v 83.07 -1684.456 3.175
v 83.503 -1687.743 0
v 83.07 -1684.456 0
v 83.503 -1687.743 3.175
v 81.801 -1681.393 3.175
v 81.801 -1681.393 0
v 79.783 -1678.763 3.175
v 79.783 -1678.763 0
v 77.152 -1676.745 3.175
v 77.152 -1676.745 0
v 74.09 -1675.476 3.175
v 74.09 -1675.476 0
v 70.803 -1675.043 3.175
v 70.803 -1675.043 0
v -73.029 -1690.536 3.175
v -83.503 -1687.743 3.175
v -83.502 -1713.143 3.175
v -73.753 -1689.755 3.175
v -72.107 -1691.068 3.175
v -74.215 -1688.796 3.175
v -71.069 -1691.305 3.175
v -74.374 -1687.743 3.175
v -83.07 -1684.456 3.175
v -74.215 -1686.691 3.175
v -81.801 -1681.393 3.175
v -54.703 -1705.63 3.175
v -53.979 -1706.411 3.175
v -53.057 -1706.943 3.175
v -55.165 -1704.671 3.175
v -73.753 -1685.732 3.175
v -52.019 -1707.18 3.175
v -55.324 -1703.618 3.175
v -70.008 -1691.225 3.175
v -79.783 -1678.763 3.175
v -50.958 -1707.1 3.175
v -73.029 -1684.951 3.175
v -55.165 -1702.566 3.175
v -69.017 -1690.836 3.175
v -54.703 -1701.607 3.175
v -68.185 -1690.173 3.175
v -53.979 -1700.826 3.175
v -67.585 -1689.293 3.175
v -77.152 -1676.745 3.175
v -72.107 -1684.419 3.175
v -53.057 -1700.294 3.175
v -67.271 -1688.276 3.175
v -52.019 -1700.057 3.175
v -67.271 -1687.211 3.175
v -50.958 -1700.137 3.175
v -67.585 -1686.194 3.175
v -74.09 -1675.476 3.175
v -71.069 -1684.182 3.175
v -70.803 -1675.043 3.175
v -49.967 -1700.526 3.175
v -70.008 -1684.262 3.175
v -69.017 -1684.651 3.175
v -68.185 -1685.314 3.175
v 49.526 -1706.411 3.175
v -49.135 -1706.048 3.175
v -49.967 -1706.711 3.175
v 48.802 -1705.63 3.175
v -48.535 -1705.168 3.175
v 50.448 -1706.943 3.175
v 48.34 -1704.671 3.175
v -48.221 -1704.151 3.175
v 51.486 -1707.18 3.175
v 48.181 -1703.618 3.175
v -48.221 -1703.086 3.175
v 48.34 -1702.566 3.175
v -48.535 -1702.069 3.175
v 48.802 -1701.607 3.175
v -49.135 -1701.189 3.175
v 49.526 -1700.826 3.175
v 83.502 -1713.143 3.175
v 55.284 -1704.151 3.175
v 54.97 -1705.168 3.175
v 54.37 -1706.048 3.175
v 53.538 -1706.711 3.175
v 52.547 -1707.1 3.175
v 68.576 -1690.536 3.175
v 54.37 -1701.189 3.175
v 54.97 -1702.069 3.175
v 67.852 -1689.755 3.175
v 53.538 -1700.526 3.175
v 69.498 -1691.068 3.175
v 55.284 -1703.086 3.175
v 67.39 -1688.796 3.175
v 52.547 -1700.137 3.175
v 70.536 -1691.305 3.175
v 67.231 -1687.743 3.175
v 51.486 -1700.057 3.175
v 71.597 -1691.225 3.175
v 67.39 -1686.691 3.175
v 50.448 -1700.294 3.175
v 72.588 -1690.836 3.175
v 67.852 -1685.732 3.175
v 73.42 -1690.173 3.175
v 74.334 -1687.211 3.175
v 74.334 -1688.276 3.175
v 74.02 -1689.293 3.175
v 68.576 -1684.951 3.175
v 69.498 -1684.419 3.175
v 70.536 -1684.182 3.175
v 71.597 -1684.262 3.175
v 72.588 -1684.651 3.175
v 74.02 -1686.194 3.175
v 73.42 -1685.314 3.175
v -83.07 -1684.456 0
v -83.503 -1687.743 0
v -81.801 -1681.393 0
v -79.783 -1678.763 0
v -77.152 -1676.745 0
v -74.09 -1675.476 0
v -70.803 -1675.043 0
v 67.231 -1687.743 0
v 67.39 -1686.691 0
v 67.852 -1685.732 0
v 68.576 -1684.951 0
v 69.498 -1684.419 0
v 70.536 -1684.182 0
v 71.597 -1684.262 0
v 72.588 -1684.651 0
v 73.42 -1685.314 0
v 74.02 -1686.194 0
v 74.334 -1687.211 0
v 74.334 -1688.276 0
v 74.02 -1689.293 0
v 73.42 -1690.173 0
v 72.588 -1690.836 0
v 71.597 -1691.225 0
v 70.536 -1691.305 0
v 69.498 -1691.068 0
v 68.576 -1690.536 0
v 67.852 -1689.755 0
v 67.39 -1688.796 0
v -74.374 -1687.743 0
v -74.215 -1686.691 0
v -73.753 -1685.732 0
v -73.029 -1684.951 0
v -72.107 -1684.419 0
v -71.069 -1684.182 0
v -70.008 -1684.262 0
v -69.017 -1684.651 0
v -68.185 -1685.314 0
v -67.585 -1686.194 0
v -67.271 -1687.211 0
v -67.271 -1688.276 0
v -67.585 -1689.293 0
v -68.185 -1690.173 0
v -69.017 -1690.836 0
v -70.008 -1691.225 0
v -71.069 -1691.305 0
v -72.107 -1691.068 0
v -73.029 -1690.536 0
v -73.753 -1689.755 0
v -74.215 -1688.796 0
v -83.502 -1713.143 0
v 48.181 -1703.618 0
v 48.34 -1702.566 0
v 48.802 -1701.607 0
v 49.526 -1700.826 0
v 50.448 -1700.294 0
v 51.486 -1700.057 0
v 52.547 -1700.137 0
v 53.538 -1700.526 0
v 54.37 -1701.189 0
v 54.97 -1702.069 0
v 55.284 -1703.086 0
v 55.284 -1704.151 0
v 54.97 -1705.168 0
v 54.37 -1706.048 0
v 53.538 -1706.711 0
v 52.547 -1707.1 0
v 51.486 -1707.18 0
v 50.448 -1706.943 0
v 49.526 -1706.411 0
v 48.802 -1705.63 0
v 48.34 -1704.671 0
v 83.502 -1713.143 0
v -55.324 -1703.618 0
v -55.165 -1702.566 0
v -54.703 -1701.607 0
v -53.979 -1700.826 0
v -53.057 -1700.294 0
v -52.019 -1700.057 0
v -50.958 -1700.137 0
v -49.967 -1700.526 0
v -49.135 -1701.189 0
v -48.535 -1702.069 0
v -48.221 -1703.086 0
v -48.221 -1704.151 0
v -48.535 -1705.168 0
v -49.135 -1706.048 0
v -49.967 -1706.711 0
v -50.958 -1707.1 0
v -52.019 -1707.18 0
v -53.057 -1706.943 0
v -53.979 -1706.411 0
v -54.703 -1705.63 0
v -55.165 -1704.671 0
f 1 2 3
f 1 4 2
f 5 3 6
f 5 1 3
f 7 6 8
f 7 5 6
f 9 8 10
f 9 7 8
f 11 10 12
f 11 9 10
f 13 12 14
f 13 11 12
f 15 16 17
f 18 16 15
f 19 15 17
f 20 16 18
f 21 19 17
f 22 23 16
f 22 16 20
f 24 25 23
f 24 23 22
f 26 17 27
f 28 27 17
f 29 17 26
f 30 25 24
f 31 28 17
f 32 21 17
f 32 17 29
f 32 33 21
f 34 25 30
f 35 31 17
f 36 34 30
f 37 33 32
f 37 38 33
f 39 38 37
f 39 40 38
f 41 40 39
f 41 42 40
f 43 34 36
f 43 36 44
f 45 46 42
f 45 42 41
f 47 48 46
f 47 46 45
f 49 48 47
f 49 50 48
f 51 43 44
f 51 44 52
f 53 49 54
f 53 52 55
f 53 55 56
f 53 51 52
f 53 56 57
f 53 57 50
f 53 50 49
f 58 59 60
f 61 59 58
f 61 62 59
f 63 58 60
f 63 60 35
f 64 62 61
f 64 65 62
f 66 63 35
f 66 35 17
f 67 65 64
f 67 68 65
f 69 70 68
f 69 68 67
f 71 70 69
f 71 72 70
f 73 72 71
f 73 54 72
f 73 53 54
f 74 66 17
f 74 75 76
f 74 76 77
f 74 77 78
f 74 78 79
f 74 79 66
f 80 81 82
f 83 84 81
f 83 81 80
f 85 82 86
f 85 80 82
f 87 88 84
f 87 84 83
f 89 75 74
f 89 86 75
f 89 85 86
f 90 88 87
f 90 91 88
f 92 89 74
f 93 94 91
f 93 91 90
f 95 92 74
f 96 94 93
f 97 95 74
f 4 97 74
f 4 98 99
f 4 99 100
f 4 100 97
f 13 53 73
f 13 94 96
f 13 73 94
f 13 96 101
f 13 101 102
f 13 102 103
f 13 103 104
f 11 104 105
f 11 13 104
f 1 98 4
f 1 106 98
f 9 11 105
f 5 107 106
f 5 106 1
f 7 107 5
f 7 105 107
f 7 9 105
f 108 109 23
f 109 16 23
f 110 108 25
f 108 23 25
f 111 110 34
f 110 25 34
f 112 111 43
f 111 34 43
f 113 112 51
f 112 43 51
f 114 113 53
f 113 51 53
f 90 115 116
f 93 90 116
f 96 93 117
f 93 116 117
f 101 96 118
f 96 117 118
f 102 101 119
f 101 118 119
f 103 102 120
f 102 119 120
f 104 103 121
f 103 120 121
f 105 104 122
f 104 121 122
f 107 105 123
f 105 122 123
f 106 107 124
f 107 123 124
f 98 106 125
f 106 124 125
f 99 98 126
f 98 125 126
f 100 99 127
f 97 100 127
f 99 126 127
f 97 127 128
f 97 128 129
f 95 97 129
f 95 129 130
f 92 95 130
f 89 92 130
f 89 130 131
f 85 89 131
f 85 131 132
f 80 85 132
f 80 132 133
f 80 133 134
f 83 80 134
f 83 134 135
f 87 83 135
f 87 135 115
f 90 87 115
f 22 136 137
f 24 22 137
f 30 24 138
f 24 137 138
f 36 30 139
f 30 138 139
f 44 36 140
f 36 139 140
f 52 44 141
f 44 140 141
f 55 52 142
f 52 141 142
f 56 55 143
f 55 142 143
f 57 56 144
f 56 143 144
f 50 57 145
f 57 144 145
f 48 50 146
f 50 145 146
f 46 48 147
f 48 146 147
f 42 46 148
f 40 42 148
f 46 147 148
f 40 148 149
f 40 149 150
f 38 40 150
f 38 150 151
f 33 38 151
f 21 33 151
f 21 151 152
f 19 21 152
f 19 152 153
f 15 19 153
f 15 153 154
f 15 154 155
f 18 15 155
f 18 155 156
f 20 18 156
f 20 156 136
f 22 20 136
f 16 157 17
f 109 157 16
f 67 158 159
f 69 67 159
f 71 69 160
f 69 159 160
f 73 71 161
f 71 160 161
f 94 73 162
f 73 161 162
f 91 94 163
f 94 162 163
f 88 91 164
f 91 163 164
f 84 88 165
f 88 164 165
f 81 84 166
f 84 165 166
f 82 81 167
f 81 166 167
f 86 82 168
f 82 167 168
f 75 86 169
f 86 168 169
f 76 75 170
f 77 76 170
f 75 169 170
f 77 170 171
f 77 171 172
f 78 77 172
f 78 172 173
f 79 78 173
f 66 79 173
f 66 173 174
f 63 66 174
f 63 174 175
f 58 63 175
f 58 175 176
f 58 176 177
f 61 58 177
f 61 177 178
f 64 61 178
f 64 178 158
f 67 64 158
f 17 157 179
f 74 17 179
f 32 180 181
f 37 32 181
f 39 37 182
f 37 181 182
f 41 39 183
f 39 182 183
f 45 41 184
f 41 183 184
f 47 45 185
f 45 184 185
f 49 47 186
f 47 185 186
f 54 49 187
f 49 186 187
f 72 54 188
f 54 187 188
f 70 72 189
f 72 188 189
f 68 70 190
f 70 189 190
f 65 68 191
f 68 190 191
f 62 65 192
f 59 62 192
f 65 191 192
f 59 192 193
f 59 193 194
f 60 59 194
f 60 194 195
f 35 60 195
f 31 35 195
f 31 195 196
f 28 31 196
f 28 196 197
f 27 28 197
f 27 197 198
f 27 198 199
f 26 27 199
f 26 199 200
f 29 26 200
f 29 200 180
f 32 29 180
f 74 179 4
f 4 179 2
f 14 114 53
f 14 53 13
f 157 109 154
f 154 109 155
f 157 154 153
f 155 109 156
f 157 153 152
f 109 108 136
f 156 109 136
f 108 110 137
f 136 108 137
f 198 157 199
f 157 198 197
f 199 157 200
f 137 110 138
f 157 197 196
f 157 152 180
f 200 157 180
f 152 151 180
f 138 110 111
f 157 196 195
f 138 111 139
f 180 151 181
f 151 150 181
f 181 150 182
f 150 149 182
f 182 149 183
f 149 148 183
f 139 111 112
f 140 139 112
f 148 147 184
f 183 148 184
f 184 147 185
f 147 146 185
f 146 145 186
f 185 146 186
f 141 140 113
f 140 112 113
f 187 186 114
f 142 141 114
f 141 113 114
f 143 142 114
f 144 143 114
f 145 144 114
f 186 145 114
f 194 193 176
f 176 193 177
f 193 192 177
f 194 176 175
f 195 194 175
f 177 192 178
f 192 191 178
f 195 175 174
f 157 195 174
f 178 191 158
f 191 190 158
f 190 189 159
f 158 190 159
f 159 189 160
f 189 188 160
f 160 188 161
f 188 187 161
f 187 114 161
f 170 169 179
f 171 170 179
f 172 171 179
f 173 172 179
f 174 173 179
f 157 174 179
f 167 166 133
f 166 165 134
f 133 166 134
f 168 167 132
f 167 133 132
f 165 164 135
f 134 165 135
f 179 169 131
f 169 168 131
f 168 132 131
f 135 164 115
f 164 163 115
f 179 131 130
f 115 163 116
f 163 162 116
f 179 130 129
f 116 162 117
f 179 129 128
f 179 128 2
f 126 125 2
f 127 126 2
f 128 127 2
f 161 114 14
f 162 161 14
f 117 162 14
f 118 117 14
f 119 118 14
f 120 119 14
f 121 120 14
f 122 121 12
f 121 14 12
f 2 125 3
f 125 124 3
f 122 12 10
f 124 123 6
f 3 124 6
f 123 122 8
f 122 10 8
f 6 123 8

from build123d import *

# Parameters (mm, degrees)
SKETCH1_W                   = 167.005
SKETCH1_H                   = 38.1
BOSS_EXTRUDE1_DEPTH         = 3.175
FILLET1_R                   = 12.7
F_1_4_CLEARANCE_HOLE1_D     = 7.14248
F_1_4_CLEARANCE_HOLE1_DEPTH = 3.175


with BuildPart() as part:
    # Sketch1 → Boss-Extrude1 (new body)
    with BuildSketch(Plane.XY):
        with Locations((0, -1694.09345438)):
            Rectangle(SKETCH1_W, SKETCH1_H)
    extrude(amount=BOSS_EXTRUDE1_DEPTH)

    # Fillet1
    fillet1_edges = [part.edges().sort_by_distance(p)[0] for p in [
        (-83.5025, -1675.04345438, 1.5875),
        (83.5025, -1675.04345438, 1.5875),
    ]]
    fillet(fillet1_edges, radius=FILLET1_R)

    # 1/4 Clearance Hole1
    with Locations(Plane.XY.offset(3.175)):
        with Locations((-70.8025, -1687.74345438), (70.8025, -1687.74345438), (51.7525, -1703.61845438), (-51.7525, -1703.61845438)):
            Hole(F_1_4_CLEARANCE_HOLE1_D / 2, depth=F_1_4_CLEARANCE_HOLE1_DEPTH)


solid = part.part
